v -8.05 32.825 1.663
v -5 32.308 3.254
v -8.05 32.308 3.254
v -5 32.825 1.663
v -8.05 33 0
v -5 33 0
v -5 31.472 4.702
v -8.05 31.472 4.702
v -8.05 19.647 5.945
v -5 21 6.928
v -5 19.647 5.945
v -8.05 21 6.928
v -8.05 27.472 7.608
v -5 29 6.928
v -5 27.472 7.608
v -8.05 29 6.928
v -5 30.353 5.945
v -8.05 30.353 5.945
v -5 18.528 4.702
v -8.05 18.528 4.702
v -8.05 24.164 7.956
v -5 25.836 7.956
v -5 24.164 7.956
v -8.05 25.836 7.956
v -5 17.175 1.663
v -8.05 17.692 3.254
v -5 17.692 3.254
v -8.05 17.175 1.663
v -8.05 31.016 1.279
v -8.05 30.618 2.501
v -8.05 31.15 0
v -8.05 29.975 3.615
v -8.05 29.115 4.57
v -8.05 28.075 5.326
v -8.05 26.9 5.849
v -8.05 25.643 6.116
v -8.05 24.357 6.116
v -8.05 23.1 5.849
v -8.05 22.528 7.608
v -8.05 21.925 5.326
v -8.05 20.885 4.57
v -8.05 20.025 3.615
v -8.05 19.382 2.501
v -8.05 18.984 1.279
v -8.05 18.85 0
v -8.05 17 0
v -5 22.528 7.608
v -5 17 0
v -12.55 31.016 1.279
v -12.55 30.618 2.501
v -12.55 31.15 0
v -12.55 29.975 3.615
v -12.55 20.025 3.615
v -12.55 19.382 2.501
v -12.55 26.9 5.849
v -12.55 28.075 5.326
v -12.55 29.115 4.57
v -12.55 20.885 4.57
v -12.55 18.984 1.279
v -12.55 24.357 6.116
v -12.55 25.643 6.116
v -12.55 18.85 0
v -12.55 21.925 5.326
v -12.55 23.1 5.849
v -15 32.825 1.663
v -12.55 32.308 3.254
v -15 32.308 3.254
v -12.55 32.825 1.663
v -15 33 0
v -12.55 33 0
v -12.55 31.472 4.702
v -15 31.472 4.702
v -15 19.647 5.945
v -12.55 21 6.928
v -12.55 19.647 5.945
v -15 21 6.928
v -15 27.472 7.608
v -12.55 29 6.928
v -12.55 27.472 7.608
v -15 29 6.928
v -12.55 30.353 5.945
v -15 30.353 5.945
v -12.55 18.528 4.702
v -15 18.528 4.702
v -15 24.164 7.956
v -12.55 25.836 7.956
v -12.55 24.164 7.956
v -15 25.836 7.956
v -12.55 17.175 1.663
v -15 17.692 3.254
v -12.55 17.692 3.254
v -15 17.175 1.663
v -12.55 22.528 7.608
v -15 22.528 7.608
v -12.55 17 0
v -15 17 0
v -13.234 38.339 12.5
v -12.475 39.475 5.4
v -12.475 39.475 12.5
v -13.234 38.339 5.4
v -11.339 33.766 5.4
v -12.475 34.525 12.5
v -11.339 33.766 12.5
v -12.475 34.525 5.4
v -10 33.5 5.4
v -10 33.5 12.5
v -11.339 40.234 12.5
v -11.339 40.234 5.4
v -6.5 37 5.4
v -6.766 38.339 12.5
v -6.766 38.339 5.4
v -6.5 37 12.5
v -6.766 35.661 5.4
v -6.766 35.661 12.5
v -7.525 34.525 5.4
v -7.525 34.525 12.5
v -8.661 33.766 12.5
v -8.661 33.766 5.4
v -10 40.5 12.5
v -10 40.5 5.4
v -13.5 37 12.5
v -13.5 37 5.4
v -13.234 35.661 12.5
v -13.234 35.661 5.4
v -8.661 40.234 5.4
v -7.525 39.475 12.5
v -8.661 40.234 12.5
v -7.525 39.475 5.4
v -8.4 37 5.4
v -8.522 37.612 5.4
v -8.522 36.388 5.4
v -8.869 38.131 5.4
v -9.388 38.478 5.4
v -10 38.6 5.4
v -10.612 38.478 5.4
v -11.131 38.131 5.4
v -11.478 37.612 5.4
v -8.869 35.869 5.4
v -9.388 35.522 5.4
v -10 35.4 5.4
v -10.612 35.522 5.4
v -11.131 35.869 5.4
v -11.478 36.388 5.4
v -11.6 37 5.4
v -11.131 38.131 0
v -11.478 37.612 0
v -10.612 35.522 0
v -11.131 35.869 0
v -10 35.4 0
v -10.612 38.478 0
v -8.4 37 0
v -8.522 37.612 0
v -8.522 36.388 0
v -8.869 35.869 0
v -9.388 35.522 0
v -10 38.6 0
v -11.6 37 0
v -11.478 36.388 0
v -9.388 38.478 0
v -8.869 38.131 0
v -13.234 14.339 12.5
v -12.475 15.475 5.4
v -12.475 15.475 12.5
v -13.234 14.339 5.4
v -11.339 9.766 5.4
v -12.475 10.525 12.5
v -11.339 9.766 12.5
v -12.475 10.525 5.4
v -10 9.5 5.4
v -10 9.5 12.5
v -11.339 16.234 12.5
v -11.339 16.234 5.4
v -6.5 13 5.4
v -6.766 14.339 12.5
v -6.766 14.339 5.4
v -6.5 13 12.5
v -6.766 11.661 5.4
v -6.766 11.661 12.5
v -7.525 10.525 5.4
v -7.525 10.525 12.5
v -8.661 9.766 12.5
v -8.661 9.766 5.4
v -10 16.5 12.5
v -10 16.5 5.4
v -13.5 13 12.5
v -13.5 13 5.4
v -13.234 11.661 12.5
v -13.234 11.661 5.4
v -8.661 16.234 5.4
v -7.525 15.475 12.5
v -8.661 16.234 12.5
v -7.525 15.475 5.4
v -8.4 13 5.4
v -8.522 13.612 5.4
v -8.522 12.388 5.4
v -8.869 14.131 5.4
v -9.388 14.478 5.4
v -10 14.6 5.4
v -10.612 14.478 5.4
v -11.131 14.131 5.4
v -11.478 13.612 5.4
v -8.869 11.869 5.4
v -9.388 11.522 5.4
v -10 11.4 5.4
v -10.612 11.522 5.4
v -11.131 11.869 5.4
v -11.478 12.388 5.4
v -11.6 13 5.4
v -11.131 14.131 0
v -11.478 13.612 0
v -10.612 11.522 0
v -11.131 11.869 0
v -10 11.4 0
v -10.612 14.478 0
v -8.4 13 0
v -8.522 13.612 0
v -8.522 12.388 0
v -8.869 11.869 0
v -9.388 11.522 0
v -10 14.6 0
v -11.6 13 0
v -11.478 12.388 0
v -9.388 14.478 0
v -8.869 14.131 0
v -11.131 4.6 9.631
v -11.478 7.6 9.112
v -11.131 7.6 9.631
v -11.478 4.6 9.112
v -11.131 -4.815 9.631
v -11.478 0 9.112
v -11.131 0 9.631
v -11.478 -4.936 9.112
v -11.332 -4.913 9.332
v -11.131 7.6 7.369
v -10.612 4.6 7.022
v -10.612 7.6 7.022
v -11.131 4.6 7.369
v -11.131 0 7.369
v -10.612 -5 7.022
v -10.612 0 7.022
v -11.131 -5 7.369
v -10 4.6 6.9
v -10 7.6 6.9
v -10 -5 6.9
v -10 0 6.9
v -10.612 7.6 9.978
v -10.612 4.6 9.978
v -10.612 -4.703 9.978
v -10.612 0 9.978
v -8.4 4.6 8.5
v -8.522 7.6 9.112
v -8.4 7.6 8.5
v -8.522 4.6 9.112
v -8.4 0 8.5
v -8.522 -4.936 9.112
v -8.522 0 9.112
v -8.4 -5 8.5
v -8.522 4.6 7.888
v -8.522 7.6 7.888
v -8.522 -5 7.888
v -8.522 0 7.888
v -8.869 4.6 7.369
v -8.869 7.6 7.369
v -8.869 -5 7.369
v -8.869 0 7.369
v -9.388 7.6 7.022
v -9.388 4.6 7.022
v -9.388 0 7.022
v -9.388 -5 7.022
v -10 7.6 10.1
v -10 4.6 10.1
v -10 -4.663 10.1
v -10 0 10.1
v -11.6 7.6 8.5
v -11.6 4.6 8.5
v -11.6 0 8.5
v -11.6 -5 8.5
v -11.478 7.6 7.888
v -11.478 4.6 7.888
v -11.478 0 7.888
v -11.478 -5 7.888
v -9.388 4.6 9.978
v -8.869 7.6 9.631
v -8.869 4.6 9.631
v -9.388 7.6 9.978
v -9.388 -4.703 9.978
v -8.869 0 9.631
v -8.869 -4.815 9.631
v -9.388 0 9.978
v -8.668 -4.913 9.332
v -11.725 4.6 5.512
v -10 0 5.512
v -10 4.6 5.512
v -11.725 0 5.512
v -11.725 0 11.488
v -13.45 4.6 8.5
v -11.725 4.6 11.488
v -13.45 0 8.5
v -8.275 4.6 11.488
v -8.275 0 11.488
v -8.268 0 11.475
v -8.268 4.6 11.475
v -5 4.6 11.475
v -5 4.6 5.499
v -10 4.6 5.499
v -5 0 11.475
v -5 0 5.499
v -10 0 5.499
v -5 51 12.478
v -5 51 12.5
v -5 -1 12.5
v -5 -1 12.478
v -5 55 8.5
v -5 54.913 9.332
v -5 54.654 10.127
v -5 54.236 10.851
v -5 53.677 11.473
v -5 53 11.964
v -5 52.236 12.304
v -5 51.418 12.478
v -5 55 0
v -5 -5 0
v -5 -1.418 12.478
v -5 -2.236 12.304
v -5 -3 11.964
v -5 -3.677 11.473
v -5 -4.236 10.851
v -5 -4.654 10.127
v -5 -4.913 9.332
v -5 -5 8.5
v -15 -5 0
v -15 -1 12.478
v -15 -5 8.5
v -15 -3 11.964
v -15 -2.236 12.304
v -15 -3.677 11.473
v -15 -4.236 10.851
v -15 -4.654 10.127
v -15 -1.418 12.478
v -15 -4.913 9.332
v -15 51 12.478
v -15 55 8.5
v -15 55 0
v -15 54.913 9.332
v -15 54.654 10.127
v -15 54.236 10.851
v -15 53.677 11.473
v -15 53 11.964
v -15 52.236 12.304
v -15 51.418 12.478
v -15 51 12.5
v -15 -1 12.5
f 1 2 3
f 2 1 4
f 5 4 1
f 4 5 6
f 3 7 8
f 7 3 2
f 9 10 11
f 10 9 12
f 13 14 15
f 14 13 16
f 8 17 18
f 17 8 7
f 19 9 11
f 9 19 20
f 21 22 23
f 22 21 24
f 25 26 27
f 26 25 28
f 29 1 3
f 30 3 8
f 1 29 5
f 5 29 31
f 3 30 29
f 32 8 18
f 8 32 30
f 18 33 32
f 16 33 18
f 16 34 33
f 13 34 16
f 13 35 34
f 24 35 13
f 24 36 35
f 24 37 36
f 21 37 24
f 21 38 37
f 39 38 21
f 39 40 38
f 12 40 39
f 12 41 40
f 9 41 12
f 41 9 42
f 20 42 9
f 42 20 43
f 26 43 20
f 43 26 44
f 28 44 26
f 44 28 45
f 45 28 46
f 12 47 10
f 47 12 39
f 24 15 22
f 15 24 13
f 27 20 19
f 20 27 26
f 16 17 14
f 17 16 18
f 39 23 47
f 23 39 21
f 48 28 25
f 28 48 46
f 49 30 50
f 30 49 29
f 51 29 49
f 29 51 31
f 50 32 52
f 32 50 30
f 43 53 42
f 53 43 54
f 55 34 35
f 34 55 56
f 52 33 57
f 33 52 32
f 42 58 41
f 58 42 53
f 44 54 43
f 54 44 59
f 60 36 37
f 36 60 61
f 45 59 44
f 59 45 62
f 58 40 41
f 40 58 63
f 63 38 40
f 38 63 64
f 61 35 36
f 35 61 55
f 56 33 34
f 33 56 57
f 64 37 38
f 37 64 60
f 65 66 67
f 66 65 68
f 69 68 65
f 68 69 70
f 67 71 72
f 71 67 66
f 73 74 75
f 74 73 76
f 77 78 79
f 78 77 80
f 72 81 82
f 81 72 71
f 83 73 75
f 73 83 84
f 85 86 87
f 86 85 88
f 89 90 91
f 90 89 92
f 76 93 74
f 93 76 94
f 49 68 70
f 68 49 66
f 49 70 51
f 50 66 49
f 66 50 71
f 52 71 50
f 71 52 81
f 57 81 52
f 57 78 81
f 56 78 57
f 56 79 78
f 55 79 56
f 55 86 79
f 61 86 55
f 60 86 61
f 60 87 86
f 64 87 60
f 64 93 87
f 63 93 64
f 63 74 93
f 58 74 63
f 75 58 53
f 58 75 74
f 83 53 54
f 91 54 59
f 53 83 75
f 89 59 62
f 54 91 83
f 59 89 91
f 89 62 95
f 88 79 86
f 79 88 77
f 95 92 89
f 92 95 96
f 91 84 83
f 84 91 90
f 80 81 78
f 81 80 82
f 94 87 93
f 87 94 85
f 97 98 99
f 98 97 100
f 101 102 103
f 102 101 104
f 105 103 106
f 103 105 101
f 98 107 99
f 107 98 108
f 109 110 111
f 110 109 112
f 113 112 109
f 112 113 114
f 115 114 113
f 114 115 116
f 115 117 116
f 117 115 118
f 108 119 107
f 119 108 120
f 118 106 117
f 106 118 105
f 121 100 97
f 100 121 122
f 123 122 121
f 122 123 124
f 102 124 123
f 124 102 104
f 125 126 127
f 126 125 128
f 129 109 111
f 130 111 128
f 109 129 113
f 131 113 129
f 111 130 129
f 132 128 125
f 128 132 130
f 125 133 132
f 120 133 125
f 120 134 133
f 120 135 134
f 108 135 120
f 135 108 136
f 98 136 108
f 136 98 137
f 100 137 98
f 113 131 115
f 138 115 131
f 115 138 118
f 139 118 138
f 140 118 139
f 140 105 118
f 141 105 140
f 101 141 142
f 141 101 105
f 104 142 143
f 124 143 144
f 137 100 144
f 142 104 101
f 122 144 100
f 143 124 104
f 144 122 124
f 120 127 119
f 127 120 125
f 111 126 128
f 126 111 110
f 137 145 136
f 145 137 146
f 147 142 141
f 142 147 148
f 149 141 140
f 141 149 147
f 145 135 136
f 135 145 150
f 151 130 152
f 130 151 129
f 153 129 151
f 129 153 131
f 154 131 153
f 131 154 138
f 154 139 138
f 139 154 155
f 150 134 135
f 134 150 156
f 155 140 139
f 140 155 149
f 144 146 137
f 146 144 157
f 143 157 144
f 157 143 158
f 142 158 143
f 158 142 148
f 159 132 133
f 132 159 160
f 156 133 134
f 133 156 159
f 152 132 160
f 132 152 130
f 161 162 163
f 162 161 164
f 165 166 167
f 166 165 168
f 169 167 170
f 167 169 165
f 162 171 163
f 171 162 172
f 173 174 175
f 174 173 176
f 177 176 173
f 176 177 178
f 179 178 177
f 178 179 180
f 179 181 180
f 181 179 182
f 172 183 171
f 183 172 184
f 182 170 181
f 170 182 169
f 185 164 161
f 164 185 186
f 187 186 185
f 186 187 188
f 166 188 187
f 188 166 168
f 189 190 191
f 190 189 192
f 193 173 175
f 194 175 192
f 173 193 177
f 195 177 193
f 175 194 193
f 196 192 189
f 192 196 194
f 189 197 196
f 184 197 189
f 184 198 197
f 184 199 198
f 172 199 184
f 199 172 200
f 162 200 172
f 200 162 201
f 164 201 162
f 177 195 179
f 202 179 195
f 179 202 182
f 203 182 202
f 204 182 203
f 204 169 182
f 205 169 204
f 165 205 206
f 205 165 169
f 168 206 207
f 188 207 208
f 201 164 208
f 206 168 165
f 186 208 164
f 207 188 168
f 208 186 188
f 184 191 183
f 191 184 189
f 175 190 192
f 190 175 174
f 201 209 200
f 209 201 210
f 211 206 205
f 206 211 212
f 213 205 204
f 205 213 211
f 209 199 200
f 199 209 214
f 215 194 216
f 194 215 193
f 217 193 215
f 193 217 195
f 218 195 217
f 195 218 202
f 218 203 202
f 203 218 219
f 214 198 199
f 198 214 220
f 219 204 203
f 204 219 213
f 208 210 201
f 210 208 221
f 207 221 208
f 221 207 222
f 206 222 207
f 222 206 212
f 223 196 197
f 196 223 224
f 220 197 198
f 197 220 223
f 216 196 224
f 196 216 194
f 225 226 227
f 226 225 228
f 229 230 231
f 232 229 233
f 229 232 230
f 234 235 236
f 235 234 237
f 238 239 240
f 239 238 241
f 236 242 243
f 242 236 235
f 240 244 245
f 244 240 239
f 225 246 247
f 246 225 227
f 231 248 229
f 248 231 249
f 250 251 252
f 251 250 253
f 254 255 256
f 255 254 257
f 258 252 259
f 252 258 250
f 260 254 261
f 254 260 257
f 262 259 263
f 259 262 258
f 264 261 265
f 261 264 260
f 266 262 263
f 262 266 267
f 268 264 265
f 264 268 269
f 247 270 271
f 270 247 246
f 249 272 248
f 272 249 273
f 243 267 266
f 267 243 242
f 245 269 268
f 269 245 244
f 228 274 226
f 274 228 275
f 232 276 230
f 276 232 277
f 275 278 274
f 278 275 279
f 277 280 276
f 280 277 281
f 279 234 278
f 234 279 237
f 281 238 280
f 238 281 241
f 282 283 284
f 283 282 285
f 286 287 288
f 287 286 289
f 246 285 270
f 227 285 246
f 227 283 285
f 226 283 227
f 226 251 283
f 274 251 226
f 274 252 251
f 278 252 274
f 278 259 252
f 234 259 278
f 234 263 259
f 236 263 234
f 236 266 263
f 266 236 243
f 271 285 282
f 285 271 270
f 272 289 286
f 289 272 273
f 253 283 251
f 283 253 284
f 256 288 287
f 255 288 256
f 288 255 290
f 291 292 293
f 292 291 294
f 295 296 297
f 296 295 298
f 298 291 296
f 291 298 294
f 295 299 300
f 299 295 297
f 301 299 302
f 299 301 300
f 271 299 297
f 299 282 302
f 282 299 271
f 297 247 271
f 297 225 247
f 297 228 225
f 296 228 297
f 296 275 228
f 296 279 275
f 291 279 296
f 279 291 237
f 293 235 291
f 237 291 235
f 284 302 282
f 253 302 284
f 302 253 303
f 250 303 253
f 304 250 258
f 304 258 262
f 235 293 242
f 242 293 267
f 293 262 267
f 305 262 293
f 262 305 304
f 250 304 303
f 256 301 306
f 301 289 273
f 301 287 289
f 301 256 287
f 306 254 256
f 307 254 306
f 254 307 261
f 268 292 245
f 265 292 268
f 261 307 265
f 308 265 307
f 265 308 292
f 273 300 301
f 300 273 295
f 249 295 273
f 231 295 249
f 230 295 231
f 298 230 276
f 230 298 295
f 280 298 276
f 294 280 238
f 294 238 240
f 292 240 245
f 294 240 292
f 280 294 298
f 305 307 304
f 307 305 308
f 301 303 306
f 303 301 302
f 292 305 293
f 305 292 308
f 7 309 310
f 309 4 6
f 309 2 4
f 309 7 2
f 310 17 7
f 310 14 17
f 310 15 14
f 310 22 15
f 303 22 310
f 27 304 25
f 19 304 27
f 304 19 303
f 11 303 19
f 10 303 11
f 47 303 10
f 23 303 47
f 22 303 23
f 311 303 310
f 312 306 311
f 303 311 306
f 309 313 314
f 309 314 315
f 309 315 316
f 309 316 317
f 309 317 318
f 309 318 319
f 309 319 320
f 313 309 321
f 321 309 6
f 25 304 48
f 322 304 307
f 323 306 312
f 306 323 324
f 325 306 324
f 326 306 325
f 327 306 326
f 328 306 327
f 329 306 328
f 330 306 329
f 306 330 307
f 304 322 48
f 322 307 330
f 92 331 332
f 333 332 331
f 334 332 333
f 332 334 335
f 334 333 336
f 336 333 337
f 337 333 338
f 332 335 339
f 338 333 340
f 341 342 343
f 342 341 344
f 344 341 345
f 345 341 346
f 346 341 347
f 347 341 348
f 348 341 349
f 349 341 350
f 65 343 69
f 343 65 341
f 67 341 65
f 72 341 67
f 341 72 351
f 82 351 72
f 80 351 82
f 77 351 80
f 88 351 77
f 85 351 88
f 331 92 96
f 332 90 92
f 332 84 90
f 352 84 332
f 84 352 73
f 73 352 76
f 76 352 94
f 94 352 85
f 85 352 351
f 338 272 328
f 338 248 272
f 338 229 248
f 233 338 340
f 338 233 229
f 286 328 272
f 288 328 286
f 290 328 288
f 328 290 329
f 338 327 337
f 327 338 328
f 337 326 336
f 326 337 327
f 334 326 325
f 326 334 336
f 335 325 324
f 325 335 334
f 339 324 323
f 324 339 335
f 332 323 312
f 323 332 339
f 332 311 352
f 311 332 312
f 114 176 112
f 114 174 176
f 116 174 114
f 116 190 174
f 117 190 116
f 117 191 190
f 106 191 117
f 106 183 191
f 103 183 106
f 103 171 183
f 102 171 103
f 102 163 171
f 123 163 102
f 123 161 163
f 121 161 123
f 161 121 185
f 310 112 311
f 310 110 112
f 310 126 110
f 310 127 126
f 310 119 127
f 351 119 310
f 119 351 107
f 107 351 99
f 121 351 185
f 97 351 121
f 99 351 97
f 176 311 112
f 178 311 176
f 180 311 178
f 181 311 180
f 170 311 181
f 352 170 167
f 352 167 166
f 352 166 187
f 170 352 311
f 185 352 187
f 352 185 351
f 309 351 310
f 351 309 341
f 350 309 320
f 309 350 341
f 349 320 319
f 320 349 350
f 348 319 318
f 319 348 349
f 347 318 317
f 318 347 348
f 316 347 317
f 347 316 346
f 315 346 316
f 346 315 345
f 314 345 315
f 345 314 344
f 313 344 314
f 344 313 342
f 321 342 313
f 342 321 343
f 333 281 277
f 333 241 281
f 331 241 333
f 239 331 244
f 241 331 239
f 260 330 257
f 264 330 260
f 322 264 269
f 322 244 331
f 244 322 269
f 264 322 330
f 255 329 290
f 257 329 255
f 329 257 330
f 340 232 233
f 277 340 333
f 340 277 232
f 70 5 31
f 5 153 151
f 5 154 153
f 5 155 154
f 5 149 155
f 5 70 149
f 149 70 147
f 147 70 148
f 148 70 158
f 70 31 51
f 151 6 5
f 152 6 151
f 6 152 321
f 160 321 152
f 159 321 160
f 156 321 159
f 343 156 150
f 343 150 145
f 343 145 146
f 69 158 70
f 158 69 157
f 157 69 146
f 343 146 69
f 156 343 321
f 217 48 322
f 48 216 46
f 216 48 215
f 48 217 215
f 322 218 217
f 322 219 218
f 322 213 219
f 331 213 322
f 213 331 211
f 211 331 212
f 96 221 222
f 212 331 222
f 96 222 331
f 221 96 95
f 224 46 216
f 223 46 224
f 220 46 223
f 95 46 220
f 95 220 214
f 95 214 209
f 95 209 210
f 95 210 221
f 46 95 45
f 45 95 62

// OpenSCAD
//
//Mount for E3D hotend clone with mount for 18mm diameter proximity sensor
// this is designed to be bolted in place of the stock folgertech extruder,
// or any extruder mounted with holes the same width as Nema17 motor screws
//    this is part of the conversion to a bowden setup
// Designed by Lee Buell
// version1.0 December 30, 2015
// GPL v3.0
//  released under Creative Commons - Attribution - Share Alike licence (CC BY-SA)
//////////////////////////////////////////////////////////////////////////////////////
// it uses two libraries from the mendel90 design, available from here:
//
// https://github.com/T3P3/Mendel90/tree/LaserCut/scad
// teardrops.scad
// utils.scad
//
//
// this was designed for the E3D clone hot ends, by changing the JHeadDiameters below, it might work with a genuine E3D hot end
//  Explanation of JHeadDiameters numbers:
//    the first is the width of the narrow part of the mount (top)
//    the second is the  width of the wide part of the mount (top)
//    the third is the width of the bottom cooling fin area, I don't have a genuine E3D, but I believe this third number is the one to change



JHeadDiameters = [12.3, 16, 25];
JHeadDimensions = [4.05, 4.05+4.8, 12.3, 18.3, 50.1];

FanMountingHoleWidth=32; //32 for a 40mm fan
FlangeThickness=8;  // Thickness of mounting flange and Hot end mounting plate
HotendHeight=25;  // height of Hot End mount on mounting flange
FanWidth=40;
FanMountPitch = 30.0; // Mounting hole pitch for ducted fan
FlangeExtension=32.0;   //Length beyond fan with for hot end to mount
FlangeLength=FanWidth+FlangeExtension;// - 5.0;  //Total flange length
HotEndHeatSinkWidth=25; //width of heat sink, ?? for E3D  25 for chinese E3D clone
HotEndMountingThinArea=12.5;  //Thin band on the top of the HE
HotEndMountingWideArea=16.5;  //Wide bands on the top of the HE
HotEndMountingThinAreaHeight=5;  //Height of thin band
HotEndMountingWideAreaHeight=13;  //Height of wide band
ProxSensorDiameter=18.5;  //Diameter of proximity sensor
ProxSensorNutDiam=28.5;   //Diameter of proximity sensor nuts
ProxSensorLockWasherDiam=31;   //Diameter of proximity sensor LockWashers
ProxSensorDiameterMountFlangeWidth=ProxSensorNutDiam+7.5;
DistanceBetweenHE_Sensor=2;  //distand between the hot end and the proximity sensor
MountingHoleDistance=sqrt((FanMountingHoleWidth/2*FanMountingHoleWidth/2)*2);
CornerRadius=4;

CarriageMountHolePitch = 20;


print_clearance=0.1; //additional clearance between two printed objects

$fn=30;

rotate([-90,0,0])
translate([25,-FlangeThickness/2,30])
difference(){
CompleteHotEndMount();
translate([0,-(ProxSensorDiameterMountFlangeWidth+DistanceBetweenHE_Sensor+HotEndHeatSinkWidth/2+5)-50,0])
cube([100,100,100], center=true);
}
!difference(){
rotate([-90,0,90])
translate([25,(ProxSensorDiameterMountFlangeWidth+DistanceBetweenHE_Sensor+HotEndHeatSinkWidth/2+5),35])
CompleteHotEndMount();
translate([0,30,-50])
cube([120,100,100], center=true);
}


module CompleteHotEndMount(){
 difference(){
    union(){
      //Flange that mounts to x-carriage
      //mounting_flange();
	  
	   //Flange to mount Hot end
      translate([0,-FlangeExtension,-HotendHeight])
      rounded_rectangle([FanWidth + 20,FlangeLength,FlangeThickness+2],CornerRadius);

      }  //union
	  
      // Cavities
      // hole for proximity sensor
      //translate([0,-20,-40])
      //ProxSensorHole();
      
      
	  // hole for jhead mount
	  echo(ProxSensorDiameterMountFlangeWidth+DistanceBetweenHE_Sensor+HotEndHeatSinkWidth/2+5);
      translate([0,-(ProxSensorDiameterMountFlangeWidth+DistanceBetweenHE_Sensor+HotEndHeatSinkWidth/2+5),-HotendHeight-6])	  
      rotate([180,0,0])
      JHead(JHeadDiameters, JHeadDimensions);
	  
      // Mount holes for carriage
      translate([( - CarriageMountHolePitch) / 2.0,-10.0,-HotendHeight]) cylinder(r= 2.55, h = FlangeThickness + 4.0, center = true);
      translate([( CarriageMountHolePitch) / 2.0,-10.0,-HotendHeight]) cylinder(r= 2.55, h = FlangeThickness + 4.0, center = true);
      
	  
      // Cutout for V-wheel nuts on carriage
      translate([( - CarriageMountHolePitch * 3) / 2,-10.0,-HotendHeight]) cylinder(r= 5, h = FlangeThickness + 4.0, center = true);
      translate([( CarriageMountHolePitch * 3) / 2,-10.0,-HotendHeight]) cylinder(r= 5, h = FlangeThickness + 4.0, center = true);
      
      // holes for retainer cap	 
	  translate([12,-(FlangeLength+1),-25])
	  rotate([90,0,180])
	 Locknut_and_screwhole(Screwlength=16,DepthOfNut=22);
	 translate([-12,-(FlangeLength+1),-25])
	  rotate([90,0,180])
	  Locknut_and_screwhole(Screwlength=16,DepthOfNut=22);
	  
      // Holes for fan mount
      translate([-47,-FlangeLength + 8.0,-25]) rotate([90,0,90]) Locknut_and_screwhole(Screwlength=16,DepthOfNut=22);
      translate([-47,-FlangeLength + 8.0 + FanMountPitch,-25]) rotate([90,0,90]) Locknut_and_screwhole(Screwlength=16,DepthOfNut=22);
      
  } //difference
}  //module

module Locknut_and_screwhole(Screwlength=16,DepthOfNut=15){
//hole for m3 bolt followed by hex hole for m3 locknut
//hole for m3 bolt - with tight fit

nutheight=4.6;  // height of locknut as it sits flat on a table  // 4.5 when printed so nut is oriented flat, 4.5 was tight due to a stray hanging part of filament
LocknutDiamater=6.9;  //  Diameter of locknut with extra clearance added so it drops in but still grips the nut without slipping  //7.1 slipped - too large
screwheaddiamater=7;  //diamter of the head of the screw
ScrewheadHoleDiam=screwheaddiamater+.3; // remember the added value on the end witll be cut in half since since openscad uses radius measurements

LengthBeforeNut=DepthOfNut;
LengthAfterNut=3;

TotalNutLength=DepthOfNut+nutheight+LengthAfterNut;
RecessedHeadDepth=(TotalNutLength-1.5)-Screwlength;

//recessed hole for m3 screw
translate([0,0,-1])
cylinder(h=RecessedHeadDepth+1,r1=screwheaddiamater/2,r2=screwheaddiamater/2, center = false, $fn=16);

//hole for m3 screw
translate([0,0,0])
cylinder(h=TotalNutLength,r1=3/2+.1,r2=3/2+.1, center = false, $fn=16);

// hole for m3 locknut
translate([0,0,DepthOfNut])
rotate([0,0,30])    //rotate the flat sides of the hex nut
cylinder(h=nutheight,r1=LocknutDiamater/2,r2=LocknutDiamater/2, center = false, $fn=6);

//hole to drop nut into
translate([-LocknutDiamater/2+.475,-15,DepthOfNut])
rotate([0,0,0])   cube([(sqrt(3)*(LocknutDiamater/2)),15,nutheight]);
}  //module

module JHead(diameters = [12, 16, 25], dimensions = [3.7, 9.3, 12.3, 18.3, 50.1]) {
    color("Red") {
      // Top of JHead
      translate([0,0,-dimensions[0]])
        cylinder(d=diameters[1], h=dimensions[0]);
      translate([0,0,-dimensions[1]-0.01])
       cylinder(d=diameters[0], h=dimensions[1]-dimensions[0]+0.5);
      translate([0,0,-dimensions[2]])
        cylinder(d=diameters[1], h=dimensions[2]-dimensions[1]+.3);
      translate([0,0,-dimensions[3]])
        cylinder(d=9, h=dimensions[3]-dimensions[2]);
      translate([0,0,-dimensions[4]]) {
        // Radiator Volume
        cylinder(d=diameters[2], h=dimensions[4]-dimensions[3]);
        translate([0,0,-10]) {
          // Throat
          cylinder(d=6, h=10);
          // Heating Block
          translate([0,5,0])
            cube([20,20,10], center=true);
          // Nozzle
          translate([0,0,-12])
            cylinder(d1=1, d2=5, h=3);
          translate([0,0,-9])
            cylinder(d=10, h=5, $fn=6);
        }
      }
    }
  }

module HotEndMountHole(){
      //thin par of Hot end neck
     cylinder(h=20, r=HotEndMountingThinArea/2, $fn=20);
     // top wide part of Hot end neck
     translate([0,0,-15])
     cylinder(h=20, r=HotEndMountingWideArea/2, $fn=20);
     // bottom wide part of Hot end neck
     translate([0,0,10])
     cylinder(h=10, r=HotEndMountingWideArea/2, $fn=20);

}  // module

module ProxSensorHole(){
  //round hole for sensor
  cylinder(h=80, r=ProxSensorDiameter/2, $fn=20);
  //hex hole for nut
  translate([0,0,-2]) rotate([0,0,30])
  cylinder(h=40, r=ProxSensorNutDiam/2, $fn=6);
}  // module

module mounting_flange(){
  difference(){
      union(){
        // vertical part of flange
        translate([0,0,-5]) rotate([90,0,0])
        rounded_rectangle([FanWidth+10,FanWidth+10,FlangeThickness],CornerRadius);
        // horizontal mount for the proximity sensor
        hull(){
          translate([0,0,-9])
          rounded_rectangle([FanWidth-8,8,27],CornerRadius);
          translate([0,-20,-20.5])
          cylinder(h=25, r=(ProxSensorDiameterMountFlangeWidth)/2, $fn=20);
           } //hull
      } //union
      //holes mounting to X-carriage
        translate([0,30,0]) rotate([90,0,0])
             for ( i = [0:3] )  // 0:3 =4 mounting holes in flange
             {
          rotate( i*360/4+45, [0, 0, 1])
          translate([MountingHoleDistance,0,0])
          cylinder(h=60, r=3.9/2, $fn=20);
             }  //for loop
      // cavities for nuts
        translate([0,30,0]) rotate([90,0,0])
             for ( i = [0:3] )  // 0:3 =4 mounting holes in flange
               {
            rotate( i*360/4+45, [0, 0, 1])
            translate([MountingHoleDistance,0,30])
            rotate([0, 0, 30])
            cylinder(h=40, r=7.1/2, $fn=6);  //was 7.2 was too loose
                }  //for loop
      // blind holes near nut cavities
          translate([0,30,0]) rotate([90,0,0])
                     for ( i = [0:3] )  // 0:3 =4 mounting holes in flange
                       {
                    rotate( i*360/4+45, [0, 0, 1])
                    translate([MountingHoleDistance,0,35])
                  //  rotate([0, 0, 45])
                    cylinder(h=40, r=8/2, $fn=20);
                        }  //for loop
  } //difference
}  //module


// From:
// https://github.com/T3P3/Mendel90/tree/LaserCut/scad
// utils.scad
module rounded_square(w, h, r)
{
    union() {
        square([w - 2 * r, h], center = true);
        square([w, h - 2 * r], center = true);
        for(x = [-w/2 + r, w/2 - r])
            for(y = [-h/2 + r, h/2 - r])
                translate([x, y])
                    circle(r = r);
    }
}

// From:
// https://github.com/T3P3/Mendel90/tree/LaserCut/scad
// utils.scad
module rounded_rectangle(size, r, center = true)
{
    w = size[0];
    h = size[1];
    linear_extrude(height = size[2], center = center)
        rounded_square(size[0], size[1], r);
}
